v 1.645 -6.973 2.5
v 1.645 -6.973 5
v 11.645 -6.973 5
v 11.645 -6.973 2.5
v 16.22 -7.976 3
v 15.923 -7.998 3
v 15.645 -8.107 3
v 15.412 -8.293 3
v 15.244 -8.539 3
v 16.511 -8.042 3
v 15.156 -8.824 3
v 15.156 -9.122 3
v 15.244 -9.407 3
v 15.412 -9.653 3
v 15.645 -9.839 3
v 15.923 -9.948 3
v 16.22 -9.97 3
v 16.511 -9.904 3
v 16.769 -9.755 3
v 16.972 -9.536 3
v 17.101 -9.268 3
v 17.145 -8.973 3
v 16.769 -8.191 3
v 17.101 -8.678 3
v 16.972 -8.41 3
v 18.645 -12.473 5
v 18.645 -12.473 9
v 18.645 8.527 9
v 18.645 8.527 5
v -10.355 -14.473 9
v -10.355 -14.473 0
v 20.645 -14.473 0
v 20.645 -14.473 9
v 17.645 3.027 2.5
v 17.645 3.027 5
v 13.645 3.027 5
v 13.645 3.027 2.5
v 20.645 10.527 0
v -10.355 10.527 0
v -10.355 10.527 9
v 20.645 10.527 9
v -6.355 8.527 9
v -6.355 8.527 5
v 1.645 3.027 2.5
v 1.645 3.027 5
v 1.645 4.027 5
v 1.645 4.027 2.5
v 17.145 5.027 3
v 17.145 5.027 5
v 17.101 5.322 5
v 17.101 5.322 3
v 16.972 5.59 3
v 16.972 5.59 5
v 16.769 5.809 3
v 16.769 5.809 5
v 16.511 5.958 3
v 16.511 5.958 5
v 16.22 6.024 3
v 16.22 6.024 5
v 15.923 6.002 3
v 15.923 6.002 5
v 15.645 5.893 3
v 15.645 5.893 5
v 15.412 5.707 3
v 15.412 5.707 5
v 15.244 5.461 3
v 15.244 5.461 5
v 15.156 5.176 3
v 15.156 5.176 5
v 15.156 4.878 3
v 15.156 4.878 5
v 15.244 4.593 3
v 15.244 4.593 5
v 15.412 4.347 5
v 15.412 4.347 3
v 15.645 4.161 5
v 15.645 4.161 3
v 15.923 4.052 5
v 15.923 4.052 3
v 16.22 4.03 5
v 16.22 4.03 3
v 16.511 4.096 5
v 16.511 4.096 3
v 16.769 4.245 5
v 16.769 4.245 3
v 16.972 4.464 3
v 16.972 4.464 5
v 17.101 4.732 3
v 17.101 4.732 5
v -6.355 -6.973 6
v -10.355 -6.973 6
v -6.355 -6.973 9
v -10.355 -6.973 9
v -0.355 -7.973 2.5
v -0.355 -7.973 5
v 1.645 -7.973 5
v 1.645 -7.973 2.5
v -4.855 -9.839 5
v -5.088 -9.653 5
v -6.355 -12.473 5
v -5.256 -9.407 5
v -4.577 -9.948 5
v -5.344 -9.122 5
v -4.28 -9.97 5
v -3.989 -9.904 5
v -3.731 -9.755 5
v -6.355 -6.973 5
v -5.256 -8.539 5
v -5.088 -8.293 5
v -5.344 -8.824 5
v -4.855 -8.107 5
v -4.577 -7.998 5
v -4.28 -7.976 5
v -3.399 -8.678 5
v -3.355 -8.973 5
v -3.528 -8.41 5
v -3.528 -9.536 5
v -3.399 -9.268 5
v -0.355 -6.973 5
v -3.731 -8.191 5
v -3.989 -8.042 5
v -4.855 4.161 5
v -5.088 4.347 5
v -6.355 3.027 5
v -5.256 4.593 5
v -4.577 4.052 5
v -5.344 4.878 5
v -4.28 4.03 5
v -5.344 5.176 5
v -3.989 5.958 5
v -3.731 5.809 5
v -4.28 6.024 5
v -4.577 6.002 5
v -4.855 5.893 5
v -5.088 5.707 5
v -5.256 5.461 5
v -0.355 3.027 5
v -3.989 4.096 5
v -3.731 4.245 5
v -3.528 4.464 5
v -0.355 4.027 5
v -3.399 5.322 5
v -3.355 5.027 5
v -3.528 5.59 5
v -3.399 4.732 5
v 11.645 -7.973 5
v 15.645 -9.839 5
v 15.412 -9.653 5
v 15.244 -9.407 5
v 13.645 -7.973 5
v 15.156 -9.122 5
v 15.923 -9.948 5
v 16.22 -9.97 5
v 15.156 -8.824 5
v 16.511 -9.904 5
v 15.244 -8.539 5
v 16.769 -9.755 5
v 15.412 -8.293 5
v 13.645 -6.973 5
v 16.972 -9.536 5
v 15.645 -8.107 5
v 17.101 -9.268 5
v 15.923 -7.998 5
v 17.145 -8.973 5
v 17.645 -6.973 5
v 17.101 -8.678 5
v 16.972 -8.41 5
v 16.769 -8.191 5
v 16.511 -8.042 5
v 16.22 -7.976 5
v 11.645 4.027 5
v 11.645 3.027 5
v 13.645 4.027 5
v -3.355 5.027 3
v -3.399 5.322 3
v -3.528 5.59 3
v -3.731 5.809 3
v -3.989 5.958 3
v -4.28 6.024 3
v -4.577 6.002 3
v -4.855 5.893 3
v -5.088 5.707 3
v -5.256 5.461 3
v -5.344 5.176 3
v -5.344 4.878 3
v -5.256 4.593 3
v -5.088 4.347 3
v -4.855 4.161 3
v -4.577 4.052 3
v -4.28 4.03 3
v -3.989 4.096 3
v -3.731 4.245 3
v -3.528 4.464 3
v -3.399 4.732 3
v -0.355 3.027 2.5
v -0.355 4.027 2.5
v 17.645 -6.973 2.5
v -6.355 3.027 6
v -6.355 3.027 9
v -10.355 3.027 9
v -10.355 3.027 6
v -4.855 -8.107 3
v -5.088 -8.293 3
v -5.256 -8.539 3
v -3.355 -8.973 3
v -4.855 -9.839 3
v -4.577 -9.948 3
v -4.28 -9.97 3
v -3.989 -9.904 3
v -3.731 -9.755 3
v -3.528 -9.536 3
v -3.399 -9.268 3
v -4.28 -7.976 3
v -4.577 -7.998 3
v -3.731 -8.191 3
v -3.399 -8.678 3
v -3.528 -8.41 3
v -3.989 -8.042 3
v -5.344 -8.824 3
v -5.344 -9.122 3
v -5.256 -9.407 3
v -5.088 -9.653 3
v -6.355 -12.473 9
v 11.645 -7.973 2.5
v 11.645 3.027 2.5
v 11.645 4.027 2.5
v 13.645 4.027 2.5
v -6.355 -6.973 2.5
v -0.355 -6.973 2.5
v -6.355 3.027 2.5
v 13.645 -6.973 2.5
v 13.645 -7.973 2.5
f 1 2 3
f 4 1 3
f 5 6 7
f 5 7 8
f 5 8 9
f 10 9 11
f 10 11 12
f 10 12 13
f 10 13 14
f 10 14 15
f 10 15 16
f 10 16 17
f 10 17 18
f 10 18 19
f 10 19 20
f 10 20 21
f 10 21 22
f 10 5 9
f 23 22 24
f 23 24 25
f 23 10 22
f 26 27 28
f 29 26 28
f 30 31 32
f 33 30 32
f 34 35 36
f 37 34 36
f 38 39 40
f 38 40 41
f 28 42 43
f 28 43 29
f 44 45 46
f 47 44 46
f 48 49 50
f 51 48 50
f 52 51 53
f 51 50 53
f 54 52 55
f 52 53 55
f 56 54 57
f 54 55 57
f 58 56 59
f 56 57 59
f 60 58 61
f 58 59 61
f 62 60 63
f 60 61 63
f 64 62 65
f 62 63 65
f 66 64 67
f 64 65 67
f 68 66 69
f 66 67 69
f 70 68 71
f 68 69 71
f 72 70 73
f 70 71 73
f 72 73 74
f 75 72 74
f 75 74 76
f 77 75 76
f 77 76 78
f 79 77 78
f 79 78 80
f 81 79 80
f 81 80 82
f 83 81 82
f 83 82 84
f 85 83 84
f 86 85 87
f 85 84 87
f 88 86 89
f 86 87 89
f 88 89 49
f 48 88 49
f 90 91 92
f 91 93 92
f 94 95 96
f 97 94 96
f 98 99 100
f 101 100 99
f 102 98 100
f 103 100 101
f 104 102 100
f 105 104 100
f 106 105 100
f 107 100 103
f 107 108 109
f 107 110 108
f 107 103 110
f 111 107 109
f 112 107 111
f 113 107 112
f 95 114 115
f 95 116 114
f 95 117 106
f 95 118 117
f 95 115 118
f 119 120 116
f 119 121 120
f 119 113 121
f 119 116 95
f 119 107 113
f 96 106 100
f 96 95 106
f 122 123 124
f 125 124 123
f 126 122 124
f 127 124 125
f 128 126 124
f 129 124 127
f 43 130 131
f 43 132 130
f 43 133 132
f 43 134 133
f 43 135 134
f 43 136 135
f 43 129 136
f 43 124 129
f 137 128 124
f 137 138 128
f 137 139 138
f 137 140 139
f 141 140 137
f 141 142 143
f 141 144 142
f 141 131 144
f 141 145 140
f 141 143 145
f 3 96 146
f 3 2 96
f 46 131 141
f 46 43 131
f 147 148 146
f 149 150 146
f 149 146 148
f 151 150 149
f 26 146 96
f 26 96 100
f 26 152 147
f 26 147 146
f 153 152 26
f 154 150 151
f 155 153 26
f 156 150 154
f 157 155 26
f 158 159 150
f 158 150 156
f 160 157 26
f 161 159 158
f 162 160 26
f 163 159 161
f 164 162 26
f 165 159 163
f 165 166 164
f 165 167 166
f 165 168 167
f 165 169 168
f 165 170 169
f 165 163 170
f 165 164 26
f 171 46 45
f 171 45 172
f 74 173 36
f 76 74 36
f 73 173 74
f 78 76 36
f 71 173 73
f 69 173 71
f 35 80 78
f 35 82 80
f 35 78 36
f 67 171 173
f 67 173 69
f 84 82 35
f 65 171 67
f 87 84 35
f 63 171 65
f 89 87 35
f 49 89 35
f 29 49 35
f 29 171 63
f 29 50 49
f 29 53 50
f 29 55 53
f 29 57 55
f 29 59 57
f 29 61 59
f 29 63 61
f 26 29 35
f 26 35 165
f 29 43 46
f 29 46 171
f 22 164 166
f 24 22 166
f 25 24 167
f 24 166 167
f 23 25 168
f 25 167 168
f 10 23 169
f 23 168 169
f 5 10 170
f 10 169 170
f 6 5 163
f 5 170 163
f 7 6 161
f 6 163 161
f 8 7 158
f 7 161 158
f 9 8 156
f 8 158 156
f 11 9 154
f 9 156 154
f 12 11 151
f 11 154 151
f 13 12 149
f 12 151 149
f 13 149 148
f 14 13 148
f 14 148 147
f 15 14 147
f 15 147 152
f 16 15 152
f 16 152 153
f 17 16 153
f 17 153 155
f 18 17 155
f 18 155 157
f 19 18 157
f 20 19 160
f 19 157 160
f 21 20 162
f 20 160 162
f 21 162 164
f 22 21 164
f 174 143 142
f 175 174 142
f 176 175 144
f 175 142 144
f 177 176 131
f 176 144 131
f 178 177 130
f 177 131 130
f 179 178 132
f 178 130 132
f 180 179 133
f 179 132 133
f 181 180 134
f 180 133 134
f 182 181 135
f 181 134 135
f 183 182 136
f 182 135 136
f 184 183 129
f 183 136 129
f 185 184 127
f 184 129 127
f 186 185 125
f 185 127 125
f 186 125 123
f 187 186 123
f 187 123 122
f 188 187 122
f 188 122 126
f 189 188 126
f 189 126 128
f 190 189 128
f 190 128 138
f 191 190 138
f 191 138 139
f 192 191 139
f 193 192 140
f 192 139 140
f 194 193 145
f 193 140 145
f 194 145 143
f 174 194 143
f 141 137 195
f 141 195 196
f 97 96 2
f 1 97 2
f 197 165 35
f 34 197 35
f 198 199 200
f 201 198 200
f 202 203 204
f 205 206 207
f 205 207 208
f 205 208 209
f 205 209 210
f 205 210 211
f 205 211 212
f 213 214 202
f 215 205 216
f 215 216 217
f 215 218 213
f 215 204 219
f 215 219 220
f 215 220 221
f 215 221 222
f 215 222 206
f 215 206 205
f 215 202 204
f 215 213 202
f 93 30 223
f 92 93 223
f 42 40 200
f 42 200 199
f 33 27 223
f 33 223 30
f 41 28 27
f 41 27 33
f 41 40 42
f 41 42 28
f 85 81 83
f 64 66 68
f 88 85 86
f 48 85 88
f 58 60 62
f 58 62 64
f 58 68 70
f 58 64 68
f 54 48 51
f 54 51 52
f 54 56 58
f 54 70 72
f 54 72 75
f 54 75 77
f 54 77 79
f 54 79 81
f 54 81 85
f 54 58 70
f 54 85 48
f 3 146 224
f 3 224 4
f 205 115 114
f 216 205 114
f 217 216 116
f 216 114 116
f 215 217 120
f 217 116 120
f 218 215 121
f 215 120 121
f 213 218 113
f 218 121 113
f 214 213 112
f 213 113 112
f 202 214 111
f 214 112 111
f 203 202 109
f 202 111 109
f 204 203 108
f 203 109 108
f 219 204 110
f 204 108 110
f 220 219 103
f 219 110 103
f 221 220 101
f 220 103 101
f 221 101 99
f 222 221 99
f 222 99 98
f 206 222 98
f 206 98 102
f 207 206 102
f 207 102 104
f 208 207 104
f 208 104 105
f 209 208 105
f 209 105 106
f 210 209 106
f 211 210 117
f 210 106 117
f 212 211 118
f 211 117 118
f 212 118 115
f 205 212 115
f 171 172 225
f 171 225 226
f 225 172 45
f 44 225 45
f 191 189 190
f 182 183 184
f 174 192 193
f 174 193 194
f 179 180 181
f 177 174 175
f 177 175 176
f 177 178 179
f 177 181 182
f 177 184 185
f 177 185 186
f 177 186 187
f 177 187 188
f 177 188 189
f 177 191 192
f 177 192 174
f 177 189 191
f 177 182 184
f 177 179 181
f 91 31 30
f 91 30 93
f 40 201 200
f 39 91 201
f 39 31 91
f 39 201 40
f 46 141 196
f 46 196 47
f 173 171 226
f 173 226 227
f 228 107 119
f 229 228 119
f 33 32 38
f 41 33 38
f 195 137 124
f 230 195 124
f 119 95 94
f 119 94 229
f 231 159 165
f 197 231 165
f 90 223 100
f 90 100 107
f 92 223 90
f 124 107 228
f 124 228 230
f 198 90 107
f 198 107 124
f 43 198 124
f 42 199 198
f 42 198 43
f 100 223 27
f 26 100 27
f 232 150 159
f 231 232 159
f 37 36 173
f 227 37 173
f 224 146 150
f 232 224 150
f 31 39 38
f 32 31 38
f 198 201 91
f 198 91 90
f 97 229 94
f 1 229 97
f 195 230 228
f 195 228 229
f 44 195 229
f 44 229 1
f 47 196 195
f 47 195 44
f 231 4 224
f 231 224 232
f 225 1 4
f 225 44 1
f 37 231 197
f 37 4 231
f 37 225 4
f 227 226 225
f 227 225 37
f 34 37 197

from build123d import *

# Parameters (mm, degrees)
F0_W     = 31
F0_H     = 25
F1_DEPTH = 9
F2_W     = 25
F2_H     = 21
F3_DEPTH = 4
F4_W     = 2
F4_H     = 1
F4_W_2   = 1
F4_H_2   = 10
F5_DEPTH = 6.5
F6_R     = 1
F7_DEPTH = 2
F8_DEPTH = 1
F9_DEPTH = 2


with BuildPart() as f1:
    # F0 (on Top) → F1 (new body)
    with BuildSketch(Plane.XY):
        with Locations((5.1452719867, -1.972973533)):
            Rectangle(F0_W, F0_H)
    extrude(amount=F1_DEPTH)

    # F2 (on face) → F3 (cut)
    with BuildSketch(Plane.XY.offset(9)):
        with Locations((6.1452719867, -1.972973533)):
            Rectangle(F2_W, F2_H)
    extrude(amount=-F3_DEPTH, mode=Mode.SUBTRACT)

    # F4 (on face) → F5 (cut)
    with BuildSketch(Plane.XY.offset(9)):
        with Locations((0.6452719867, 3.527026467)):
            Rectangle(F4_W, F4_H)
        with Locations((12.6452719867, 3.527026467)):
            Rectangle(F4_W, F4_H)
        with Locations((0.6452719867, -7.472973533)):
            Rectangle(F4_W, F4_H)
        with Locations((12.6452719867, -7.472973533)):
            Rectangle(F4_W, F4_H)
        with Locations((17.1452719867, -1.972973533)):
            Rectangle(F4_W_2, F4_H_2)
        Polygon((1.6452719867, 3.027026467), (-0.3547280133, 3.027026467), (-6.3547280133, 3.027026467), (-6.3547280133, -6.972973533), (-0.3547280133, -6.972973533), (1.6452719867, -6.972973533), (11.6452719867, -6.972973533), (13.6452719867, -6.972973533), (16.6452719867, -6.972973533), (16.6452719867, 3.027026467), (13.6452719867, 3.027026467), (11.6452719867, 3.027026467), align=None)
    extrude(amount=-F5_DEPTH, mode=Mode.SUBTRACT)

    # F6 (on face) → F7 (cut)
    with BuildSketch(Plane.XY.offset(5)):
        with Locations((-4.3547280133, 5.027026467)):
            Circle(F6_R)
        with Locations((16.1452719867, 5.027026467)):
            Circle(F6_R)
        with Locations((-4.3547280133, -8.972973533)):
            Circle(F6_R)
        with Locations((16.1452719867, -8.972973533)):
            Circle(F6_R)
    extrude(amount=-F7_DEPTH, mode=Mode.SUBTRACT)

    # F4 (on face) → F8 (cut)
    with BuildSketch(Plane.XY.offset(9)):
        Polygon((-0.3547280133, 3.027026467), (-10.3547280133, 3.027026467), (-10.3547280133, -6.972973533), (-0.3547280133, -6.972973533), (1.6452719867, -6.972973533), (11.6452719867, -6.972973533), (13.6452719867, -6.972973533), (16.6452719867, -6.972973533), (16.6452719867, 3.027026467), (13.6452719867, 3.027026467), (11.6452719867, 3.027026467), (1.6452719867, 3.027026467), align=None)
        with Locations((0.6452719867, 3.527026467)):
            Rectangle(F4_W, F4_H)
        with Locations((0.6452719867, -7.472973533)):
            Rectangle(F4_W, F4_H)
        with Locations((12.6452719867, 3.527026467)):
            Rectangle(F4_W, F4_H)
        with Locations((12.6452719867, -7.472973533)):
            Rectangle(F4_W, F4_H)
        with Locations((17.1452719867, -1.972973533)):
            Rectangle(F4_W_2, F4_H_2)
    extrude(amount=-F8_DEPTH, mode=Mode.SUBTRACT)

    # F9 (cut): a face of the model
    f9_faces = [f1.faces().sort_by_distance(p)[0] for p in [
        (-8.3547280133, -1.972973533, 8),
    ]]
    extrude(f9_faces, amount=-F9_DEPTH, mode=Mode.SUBTRACT)


solid = f1.part
